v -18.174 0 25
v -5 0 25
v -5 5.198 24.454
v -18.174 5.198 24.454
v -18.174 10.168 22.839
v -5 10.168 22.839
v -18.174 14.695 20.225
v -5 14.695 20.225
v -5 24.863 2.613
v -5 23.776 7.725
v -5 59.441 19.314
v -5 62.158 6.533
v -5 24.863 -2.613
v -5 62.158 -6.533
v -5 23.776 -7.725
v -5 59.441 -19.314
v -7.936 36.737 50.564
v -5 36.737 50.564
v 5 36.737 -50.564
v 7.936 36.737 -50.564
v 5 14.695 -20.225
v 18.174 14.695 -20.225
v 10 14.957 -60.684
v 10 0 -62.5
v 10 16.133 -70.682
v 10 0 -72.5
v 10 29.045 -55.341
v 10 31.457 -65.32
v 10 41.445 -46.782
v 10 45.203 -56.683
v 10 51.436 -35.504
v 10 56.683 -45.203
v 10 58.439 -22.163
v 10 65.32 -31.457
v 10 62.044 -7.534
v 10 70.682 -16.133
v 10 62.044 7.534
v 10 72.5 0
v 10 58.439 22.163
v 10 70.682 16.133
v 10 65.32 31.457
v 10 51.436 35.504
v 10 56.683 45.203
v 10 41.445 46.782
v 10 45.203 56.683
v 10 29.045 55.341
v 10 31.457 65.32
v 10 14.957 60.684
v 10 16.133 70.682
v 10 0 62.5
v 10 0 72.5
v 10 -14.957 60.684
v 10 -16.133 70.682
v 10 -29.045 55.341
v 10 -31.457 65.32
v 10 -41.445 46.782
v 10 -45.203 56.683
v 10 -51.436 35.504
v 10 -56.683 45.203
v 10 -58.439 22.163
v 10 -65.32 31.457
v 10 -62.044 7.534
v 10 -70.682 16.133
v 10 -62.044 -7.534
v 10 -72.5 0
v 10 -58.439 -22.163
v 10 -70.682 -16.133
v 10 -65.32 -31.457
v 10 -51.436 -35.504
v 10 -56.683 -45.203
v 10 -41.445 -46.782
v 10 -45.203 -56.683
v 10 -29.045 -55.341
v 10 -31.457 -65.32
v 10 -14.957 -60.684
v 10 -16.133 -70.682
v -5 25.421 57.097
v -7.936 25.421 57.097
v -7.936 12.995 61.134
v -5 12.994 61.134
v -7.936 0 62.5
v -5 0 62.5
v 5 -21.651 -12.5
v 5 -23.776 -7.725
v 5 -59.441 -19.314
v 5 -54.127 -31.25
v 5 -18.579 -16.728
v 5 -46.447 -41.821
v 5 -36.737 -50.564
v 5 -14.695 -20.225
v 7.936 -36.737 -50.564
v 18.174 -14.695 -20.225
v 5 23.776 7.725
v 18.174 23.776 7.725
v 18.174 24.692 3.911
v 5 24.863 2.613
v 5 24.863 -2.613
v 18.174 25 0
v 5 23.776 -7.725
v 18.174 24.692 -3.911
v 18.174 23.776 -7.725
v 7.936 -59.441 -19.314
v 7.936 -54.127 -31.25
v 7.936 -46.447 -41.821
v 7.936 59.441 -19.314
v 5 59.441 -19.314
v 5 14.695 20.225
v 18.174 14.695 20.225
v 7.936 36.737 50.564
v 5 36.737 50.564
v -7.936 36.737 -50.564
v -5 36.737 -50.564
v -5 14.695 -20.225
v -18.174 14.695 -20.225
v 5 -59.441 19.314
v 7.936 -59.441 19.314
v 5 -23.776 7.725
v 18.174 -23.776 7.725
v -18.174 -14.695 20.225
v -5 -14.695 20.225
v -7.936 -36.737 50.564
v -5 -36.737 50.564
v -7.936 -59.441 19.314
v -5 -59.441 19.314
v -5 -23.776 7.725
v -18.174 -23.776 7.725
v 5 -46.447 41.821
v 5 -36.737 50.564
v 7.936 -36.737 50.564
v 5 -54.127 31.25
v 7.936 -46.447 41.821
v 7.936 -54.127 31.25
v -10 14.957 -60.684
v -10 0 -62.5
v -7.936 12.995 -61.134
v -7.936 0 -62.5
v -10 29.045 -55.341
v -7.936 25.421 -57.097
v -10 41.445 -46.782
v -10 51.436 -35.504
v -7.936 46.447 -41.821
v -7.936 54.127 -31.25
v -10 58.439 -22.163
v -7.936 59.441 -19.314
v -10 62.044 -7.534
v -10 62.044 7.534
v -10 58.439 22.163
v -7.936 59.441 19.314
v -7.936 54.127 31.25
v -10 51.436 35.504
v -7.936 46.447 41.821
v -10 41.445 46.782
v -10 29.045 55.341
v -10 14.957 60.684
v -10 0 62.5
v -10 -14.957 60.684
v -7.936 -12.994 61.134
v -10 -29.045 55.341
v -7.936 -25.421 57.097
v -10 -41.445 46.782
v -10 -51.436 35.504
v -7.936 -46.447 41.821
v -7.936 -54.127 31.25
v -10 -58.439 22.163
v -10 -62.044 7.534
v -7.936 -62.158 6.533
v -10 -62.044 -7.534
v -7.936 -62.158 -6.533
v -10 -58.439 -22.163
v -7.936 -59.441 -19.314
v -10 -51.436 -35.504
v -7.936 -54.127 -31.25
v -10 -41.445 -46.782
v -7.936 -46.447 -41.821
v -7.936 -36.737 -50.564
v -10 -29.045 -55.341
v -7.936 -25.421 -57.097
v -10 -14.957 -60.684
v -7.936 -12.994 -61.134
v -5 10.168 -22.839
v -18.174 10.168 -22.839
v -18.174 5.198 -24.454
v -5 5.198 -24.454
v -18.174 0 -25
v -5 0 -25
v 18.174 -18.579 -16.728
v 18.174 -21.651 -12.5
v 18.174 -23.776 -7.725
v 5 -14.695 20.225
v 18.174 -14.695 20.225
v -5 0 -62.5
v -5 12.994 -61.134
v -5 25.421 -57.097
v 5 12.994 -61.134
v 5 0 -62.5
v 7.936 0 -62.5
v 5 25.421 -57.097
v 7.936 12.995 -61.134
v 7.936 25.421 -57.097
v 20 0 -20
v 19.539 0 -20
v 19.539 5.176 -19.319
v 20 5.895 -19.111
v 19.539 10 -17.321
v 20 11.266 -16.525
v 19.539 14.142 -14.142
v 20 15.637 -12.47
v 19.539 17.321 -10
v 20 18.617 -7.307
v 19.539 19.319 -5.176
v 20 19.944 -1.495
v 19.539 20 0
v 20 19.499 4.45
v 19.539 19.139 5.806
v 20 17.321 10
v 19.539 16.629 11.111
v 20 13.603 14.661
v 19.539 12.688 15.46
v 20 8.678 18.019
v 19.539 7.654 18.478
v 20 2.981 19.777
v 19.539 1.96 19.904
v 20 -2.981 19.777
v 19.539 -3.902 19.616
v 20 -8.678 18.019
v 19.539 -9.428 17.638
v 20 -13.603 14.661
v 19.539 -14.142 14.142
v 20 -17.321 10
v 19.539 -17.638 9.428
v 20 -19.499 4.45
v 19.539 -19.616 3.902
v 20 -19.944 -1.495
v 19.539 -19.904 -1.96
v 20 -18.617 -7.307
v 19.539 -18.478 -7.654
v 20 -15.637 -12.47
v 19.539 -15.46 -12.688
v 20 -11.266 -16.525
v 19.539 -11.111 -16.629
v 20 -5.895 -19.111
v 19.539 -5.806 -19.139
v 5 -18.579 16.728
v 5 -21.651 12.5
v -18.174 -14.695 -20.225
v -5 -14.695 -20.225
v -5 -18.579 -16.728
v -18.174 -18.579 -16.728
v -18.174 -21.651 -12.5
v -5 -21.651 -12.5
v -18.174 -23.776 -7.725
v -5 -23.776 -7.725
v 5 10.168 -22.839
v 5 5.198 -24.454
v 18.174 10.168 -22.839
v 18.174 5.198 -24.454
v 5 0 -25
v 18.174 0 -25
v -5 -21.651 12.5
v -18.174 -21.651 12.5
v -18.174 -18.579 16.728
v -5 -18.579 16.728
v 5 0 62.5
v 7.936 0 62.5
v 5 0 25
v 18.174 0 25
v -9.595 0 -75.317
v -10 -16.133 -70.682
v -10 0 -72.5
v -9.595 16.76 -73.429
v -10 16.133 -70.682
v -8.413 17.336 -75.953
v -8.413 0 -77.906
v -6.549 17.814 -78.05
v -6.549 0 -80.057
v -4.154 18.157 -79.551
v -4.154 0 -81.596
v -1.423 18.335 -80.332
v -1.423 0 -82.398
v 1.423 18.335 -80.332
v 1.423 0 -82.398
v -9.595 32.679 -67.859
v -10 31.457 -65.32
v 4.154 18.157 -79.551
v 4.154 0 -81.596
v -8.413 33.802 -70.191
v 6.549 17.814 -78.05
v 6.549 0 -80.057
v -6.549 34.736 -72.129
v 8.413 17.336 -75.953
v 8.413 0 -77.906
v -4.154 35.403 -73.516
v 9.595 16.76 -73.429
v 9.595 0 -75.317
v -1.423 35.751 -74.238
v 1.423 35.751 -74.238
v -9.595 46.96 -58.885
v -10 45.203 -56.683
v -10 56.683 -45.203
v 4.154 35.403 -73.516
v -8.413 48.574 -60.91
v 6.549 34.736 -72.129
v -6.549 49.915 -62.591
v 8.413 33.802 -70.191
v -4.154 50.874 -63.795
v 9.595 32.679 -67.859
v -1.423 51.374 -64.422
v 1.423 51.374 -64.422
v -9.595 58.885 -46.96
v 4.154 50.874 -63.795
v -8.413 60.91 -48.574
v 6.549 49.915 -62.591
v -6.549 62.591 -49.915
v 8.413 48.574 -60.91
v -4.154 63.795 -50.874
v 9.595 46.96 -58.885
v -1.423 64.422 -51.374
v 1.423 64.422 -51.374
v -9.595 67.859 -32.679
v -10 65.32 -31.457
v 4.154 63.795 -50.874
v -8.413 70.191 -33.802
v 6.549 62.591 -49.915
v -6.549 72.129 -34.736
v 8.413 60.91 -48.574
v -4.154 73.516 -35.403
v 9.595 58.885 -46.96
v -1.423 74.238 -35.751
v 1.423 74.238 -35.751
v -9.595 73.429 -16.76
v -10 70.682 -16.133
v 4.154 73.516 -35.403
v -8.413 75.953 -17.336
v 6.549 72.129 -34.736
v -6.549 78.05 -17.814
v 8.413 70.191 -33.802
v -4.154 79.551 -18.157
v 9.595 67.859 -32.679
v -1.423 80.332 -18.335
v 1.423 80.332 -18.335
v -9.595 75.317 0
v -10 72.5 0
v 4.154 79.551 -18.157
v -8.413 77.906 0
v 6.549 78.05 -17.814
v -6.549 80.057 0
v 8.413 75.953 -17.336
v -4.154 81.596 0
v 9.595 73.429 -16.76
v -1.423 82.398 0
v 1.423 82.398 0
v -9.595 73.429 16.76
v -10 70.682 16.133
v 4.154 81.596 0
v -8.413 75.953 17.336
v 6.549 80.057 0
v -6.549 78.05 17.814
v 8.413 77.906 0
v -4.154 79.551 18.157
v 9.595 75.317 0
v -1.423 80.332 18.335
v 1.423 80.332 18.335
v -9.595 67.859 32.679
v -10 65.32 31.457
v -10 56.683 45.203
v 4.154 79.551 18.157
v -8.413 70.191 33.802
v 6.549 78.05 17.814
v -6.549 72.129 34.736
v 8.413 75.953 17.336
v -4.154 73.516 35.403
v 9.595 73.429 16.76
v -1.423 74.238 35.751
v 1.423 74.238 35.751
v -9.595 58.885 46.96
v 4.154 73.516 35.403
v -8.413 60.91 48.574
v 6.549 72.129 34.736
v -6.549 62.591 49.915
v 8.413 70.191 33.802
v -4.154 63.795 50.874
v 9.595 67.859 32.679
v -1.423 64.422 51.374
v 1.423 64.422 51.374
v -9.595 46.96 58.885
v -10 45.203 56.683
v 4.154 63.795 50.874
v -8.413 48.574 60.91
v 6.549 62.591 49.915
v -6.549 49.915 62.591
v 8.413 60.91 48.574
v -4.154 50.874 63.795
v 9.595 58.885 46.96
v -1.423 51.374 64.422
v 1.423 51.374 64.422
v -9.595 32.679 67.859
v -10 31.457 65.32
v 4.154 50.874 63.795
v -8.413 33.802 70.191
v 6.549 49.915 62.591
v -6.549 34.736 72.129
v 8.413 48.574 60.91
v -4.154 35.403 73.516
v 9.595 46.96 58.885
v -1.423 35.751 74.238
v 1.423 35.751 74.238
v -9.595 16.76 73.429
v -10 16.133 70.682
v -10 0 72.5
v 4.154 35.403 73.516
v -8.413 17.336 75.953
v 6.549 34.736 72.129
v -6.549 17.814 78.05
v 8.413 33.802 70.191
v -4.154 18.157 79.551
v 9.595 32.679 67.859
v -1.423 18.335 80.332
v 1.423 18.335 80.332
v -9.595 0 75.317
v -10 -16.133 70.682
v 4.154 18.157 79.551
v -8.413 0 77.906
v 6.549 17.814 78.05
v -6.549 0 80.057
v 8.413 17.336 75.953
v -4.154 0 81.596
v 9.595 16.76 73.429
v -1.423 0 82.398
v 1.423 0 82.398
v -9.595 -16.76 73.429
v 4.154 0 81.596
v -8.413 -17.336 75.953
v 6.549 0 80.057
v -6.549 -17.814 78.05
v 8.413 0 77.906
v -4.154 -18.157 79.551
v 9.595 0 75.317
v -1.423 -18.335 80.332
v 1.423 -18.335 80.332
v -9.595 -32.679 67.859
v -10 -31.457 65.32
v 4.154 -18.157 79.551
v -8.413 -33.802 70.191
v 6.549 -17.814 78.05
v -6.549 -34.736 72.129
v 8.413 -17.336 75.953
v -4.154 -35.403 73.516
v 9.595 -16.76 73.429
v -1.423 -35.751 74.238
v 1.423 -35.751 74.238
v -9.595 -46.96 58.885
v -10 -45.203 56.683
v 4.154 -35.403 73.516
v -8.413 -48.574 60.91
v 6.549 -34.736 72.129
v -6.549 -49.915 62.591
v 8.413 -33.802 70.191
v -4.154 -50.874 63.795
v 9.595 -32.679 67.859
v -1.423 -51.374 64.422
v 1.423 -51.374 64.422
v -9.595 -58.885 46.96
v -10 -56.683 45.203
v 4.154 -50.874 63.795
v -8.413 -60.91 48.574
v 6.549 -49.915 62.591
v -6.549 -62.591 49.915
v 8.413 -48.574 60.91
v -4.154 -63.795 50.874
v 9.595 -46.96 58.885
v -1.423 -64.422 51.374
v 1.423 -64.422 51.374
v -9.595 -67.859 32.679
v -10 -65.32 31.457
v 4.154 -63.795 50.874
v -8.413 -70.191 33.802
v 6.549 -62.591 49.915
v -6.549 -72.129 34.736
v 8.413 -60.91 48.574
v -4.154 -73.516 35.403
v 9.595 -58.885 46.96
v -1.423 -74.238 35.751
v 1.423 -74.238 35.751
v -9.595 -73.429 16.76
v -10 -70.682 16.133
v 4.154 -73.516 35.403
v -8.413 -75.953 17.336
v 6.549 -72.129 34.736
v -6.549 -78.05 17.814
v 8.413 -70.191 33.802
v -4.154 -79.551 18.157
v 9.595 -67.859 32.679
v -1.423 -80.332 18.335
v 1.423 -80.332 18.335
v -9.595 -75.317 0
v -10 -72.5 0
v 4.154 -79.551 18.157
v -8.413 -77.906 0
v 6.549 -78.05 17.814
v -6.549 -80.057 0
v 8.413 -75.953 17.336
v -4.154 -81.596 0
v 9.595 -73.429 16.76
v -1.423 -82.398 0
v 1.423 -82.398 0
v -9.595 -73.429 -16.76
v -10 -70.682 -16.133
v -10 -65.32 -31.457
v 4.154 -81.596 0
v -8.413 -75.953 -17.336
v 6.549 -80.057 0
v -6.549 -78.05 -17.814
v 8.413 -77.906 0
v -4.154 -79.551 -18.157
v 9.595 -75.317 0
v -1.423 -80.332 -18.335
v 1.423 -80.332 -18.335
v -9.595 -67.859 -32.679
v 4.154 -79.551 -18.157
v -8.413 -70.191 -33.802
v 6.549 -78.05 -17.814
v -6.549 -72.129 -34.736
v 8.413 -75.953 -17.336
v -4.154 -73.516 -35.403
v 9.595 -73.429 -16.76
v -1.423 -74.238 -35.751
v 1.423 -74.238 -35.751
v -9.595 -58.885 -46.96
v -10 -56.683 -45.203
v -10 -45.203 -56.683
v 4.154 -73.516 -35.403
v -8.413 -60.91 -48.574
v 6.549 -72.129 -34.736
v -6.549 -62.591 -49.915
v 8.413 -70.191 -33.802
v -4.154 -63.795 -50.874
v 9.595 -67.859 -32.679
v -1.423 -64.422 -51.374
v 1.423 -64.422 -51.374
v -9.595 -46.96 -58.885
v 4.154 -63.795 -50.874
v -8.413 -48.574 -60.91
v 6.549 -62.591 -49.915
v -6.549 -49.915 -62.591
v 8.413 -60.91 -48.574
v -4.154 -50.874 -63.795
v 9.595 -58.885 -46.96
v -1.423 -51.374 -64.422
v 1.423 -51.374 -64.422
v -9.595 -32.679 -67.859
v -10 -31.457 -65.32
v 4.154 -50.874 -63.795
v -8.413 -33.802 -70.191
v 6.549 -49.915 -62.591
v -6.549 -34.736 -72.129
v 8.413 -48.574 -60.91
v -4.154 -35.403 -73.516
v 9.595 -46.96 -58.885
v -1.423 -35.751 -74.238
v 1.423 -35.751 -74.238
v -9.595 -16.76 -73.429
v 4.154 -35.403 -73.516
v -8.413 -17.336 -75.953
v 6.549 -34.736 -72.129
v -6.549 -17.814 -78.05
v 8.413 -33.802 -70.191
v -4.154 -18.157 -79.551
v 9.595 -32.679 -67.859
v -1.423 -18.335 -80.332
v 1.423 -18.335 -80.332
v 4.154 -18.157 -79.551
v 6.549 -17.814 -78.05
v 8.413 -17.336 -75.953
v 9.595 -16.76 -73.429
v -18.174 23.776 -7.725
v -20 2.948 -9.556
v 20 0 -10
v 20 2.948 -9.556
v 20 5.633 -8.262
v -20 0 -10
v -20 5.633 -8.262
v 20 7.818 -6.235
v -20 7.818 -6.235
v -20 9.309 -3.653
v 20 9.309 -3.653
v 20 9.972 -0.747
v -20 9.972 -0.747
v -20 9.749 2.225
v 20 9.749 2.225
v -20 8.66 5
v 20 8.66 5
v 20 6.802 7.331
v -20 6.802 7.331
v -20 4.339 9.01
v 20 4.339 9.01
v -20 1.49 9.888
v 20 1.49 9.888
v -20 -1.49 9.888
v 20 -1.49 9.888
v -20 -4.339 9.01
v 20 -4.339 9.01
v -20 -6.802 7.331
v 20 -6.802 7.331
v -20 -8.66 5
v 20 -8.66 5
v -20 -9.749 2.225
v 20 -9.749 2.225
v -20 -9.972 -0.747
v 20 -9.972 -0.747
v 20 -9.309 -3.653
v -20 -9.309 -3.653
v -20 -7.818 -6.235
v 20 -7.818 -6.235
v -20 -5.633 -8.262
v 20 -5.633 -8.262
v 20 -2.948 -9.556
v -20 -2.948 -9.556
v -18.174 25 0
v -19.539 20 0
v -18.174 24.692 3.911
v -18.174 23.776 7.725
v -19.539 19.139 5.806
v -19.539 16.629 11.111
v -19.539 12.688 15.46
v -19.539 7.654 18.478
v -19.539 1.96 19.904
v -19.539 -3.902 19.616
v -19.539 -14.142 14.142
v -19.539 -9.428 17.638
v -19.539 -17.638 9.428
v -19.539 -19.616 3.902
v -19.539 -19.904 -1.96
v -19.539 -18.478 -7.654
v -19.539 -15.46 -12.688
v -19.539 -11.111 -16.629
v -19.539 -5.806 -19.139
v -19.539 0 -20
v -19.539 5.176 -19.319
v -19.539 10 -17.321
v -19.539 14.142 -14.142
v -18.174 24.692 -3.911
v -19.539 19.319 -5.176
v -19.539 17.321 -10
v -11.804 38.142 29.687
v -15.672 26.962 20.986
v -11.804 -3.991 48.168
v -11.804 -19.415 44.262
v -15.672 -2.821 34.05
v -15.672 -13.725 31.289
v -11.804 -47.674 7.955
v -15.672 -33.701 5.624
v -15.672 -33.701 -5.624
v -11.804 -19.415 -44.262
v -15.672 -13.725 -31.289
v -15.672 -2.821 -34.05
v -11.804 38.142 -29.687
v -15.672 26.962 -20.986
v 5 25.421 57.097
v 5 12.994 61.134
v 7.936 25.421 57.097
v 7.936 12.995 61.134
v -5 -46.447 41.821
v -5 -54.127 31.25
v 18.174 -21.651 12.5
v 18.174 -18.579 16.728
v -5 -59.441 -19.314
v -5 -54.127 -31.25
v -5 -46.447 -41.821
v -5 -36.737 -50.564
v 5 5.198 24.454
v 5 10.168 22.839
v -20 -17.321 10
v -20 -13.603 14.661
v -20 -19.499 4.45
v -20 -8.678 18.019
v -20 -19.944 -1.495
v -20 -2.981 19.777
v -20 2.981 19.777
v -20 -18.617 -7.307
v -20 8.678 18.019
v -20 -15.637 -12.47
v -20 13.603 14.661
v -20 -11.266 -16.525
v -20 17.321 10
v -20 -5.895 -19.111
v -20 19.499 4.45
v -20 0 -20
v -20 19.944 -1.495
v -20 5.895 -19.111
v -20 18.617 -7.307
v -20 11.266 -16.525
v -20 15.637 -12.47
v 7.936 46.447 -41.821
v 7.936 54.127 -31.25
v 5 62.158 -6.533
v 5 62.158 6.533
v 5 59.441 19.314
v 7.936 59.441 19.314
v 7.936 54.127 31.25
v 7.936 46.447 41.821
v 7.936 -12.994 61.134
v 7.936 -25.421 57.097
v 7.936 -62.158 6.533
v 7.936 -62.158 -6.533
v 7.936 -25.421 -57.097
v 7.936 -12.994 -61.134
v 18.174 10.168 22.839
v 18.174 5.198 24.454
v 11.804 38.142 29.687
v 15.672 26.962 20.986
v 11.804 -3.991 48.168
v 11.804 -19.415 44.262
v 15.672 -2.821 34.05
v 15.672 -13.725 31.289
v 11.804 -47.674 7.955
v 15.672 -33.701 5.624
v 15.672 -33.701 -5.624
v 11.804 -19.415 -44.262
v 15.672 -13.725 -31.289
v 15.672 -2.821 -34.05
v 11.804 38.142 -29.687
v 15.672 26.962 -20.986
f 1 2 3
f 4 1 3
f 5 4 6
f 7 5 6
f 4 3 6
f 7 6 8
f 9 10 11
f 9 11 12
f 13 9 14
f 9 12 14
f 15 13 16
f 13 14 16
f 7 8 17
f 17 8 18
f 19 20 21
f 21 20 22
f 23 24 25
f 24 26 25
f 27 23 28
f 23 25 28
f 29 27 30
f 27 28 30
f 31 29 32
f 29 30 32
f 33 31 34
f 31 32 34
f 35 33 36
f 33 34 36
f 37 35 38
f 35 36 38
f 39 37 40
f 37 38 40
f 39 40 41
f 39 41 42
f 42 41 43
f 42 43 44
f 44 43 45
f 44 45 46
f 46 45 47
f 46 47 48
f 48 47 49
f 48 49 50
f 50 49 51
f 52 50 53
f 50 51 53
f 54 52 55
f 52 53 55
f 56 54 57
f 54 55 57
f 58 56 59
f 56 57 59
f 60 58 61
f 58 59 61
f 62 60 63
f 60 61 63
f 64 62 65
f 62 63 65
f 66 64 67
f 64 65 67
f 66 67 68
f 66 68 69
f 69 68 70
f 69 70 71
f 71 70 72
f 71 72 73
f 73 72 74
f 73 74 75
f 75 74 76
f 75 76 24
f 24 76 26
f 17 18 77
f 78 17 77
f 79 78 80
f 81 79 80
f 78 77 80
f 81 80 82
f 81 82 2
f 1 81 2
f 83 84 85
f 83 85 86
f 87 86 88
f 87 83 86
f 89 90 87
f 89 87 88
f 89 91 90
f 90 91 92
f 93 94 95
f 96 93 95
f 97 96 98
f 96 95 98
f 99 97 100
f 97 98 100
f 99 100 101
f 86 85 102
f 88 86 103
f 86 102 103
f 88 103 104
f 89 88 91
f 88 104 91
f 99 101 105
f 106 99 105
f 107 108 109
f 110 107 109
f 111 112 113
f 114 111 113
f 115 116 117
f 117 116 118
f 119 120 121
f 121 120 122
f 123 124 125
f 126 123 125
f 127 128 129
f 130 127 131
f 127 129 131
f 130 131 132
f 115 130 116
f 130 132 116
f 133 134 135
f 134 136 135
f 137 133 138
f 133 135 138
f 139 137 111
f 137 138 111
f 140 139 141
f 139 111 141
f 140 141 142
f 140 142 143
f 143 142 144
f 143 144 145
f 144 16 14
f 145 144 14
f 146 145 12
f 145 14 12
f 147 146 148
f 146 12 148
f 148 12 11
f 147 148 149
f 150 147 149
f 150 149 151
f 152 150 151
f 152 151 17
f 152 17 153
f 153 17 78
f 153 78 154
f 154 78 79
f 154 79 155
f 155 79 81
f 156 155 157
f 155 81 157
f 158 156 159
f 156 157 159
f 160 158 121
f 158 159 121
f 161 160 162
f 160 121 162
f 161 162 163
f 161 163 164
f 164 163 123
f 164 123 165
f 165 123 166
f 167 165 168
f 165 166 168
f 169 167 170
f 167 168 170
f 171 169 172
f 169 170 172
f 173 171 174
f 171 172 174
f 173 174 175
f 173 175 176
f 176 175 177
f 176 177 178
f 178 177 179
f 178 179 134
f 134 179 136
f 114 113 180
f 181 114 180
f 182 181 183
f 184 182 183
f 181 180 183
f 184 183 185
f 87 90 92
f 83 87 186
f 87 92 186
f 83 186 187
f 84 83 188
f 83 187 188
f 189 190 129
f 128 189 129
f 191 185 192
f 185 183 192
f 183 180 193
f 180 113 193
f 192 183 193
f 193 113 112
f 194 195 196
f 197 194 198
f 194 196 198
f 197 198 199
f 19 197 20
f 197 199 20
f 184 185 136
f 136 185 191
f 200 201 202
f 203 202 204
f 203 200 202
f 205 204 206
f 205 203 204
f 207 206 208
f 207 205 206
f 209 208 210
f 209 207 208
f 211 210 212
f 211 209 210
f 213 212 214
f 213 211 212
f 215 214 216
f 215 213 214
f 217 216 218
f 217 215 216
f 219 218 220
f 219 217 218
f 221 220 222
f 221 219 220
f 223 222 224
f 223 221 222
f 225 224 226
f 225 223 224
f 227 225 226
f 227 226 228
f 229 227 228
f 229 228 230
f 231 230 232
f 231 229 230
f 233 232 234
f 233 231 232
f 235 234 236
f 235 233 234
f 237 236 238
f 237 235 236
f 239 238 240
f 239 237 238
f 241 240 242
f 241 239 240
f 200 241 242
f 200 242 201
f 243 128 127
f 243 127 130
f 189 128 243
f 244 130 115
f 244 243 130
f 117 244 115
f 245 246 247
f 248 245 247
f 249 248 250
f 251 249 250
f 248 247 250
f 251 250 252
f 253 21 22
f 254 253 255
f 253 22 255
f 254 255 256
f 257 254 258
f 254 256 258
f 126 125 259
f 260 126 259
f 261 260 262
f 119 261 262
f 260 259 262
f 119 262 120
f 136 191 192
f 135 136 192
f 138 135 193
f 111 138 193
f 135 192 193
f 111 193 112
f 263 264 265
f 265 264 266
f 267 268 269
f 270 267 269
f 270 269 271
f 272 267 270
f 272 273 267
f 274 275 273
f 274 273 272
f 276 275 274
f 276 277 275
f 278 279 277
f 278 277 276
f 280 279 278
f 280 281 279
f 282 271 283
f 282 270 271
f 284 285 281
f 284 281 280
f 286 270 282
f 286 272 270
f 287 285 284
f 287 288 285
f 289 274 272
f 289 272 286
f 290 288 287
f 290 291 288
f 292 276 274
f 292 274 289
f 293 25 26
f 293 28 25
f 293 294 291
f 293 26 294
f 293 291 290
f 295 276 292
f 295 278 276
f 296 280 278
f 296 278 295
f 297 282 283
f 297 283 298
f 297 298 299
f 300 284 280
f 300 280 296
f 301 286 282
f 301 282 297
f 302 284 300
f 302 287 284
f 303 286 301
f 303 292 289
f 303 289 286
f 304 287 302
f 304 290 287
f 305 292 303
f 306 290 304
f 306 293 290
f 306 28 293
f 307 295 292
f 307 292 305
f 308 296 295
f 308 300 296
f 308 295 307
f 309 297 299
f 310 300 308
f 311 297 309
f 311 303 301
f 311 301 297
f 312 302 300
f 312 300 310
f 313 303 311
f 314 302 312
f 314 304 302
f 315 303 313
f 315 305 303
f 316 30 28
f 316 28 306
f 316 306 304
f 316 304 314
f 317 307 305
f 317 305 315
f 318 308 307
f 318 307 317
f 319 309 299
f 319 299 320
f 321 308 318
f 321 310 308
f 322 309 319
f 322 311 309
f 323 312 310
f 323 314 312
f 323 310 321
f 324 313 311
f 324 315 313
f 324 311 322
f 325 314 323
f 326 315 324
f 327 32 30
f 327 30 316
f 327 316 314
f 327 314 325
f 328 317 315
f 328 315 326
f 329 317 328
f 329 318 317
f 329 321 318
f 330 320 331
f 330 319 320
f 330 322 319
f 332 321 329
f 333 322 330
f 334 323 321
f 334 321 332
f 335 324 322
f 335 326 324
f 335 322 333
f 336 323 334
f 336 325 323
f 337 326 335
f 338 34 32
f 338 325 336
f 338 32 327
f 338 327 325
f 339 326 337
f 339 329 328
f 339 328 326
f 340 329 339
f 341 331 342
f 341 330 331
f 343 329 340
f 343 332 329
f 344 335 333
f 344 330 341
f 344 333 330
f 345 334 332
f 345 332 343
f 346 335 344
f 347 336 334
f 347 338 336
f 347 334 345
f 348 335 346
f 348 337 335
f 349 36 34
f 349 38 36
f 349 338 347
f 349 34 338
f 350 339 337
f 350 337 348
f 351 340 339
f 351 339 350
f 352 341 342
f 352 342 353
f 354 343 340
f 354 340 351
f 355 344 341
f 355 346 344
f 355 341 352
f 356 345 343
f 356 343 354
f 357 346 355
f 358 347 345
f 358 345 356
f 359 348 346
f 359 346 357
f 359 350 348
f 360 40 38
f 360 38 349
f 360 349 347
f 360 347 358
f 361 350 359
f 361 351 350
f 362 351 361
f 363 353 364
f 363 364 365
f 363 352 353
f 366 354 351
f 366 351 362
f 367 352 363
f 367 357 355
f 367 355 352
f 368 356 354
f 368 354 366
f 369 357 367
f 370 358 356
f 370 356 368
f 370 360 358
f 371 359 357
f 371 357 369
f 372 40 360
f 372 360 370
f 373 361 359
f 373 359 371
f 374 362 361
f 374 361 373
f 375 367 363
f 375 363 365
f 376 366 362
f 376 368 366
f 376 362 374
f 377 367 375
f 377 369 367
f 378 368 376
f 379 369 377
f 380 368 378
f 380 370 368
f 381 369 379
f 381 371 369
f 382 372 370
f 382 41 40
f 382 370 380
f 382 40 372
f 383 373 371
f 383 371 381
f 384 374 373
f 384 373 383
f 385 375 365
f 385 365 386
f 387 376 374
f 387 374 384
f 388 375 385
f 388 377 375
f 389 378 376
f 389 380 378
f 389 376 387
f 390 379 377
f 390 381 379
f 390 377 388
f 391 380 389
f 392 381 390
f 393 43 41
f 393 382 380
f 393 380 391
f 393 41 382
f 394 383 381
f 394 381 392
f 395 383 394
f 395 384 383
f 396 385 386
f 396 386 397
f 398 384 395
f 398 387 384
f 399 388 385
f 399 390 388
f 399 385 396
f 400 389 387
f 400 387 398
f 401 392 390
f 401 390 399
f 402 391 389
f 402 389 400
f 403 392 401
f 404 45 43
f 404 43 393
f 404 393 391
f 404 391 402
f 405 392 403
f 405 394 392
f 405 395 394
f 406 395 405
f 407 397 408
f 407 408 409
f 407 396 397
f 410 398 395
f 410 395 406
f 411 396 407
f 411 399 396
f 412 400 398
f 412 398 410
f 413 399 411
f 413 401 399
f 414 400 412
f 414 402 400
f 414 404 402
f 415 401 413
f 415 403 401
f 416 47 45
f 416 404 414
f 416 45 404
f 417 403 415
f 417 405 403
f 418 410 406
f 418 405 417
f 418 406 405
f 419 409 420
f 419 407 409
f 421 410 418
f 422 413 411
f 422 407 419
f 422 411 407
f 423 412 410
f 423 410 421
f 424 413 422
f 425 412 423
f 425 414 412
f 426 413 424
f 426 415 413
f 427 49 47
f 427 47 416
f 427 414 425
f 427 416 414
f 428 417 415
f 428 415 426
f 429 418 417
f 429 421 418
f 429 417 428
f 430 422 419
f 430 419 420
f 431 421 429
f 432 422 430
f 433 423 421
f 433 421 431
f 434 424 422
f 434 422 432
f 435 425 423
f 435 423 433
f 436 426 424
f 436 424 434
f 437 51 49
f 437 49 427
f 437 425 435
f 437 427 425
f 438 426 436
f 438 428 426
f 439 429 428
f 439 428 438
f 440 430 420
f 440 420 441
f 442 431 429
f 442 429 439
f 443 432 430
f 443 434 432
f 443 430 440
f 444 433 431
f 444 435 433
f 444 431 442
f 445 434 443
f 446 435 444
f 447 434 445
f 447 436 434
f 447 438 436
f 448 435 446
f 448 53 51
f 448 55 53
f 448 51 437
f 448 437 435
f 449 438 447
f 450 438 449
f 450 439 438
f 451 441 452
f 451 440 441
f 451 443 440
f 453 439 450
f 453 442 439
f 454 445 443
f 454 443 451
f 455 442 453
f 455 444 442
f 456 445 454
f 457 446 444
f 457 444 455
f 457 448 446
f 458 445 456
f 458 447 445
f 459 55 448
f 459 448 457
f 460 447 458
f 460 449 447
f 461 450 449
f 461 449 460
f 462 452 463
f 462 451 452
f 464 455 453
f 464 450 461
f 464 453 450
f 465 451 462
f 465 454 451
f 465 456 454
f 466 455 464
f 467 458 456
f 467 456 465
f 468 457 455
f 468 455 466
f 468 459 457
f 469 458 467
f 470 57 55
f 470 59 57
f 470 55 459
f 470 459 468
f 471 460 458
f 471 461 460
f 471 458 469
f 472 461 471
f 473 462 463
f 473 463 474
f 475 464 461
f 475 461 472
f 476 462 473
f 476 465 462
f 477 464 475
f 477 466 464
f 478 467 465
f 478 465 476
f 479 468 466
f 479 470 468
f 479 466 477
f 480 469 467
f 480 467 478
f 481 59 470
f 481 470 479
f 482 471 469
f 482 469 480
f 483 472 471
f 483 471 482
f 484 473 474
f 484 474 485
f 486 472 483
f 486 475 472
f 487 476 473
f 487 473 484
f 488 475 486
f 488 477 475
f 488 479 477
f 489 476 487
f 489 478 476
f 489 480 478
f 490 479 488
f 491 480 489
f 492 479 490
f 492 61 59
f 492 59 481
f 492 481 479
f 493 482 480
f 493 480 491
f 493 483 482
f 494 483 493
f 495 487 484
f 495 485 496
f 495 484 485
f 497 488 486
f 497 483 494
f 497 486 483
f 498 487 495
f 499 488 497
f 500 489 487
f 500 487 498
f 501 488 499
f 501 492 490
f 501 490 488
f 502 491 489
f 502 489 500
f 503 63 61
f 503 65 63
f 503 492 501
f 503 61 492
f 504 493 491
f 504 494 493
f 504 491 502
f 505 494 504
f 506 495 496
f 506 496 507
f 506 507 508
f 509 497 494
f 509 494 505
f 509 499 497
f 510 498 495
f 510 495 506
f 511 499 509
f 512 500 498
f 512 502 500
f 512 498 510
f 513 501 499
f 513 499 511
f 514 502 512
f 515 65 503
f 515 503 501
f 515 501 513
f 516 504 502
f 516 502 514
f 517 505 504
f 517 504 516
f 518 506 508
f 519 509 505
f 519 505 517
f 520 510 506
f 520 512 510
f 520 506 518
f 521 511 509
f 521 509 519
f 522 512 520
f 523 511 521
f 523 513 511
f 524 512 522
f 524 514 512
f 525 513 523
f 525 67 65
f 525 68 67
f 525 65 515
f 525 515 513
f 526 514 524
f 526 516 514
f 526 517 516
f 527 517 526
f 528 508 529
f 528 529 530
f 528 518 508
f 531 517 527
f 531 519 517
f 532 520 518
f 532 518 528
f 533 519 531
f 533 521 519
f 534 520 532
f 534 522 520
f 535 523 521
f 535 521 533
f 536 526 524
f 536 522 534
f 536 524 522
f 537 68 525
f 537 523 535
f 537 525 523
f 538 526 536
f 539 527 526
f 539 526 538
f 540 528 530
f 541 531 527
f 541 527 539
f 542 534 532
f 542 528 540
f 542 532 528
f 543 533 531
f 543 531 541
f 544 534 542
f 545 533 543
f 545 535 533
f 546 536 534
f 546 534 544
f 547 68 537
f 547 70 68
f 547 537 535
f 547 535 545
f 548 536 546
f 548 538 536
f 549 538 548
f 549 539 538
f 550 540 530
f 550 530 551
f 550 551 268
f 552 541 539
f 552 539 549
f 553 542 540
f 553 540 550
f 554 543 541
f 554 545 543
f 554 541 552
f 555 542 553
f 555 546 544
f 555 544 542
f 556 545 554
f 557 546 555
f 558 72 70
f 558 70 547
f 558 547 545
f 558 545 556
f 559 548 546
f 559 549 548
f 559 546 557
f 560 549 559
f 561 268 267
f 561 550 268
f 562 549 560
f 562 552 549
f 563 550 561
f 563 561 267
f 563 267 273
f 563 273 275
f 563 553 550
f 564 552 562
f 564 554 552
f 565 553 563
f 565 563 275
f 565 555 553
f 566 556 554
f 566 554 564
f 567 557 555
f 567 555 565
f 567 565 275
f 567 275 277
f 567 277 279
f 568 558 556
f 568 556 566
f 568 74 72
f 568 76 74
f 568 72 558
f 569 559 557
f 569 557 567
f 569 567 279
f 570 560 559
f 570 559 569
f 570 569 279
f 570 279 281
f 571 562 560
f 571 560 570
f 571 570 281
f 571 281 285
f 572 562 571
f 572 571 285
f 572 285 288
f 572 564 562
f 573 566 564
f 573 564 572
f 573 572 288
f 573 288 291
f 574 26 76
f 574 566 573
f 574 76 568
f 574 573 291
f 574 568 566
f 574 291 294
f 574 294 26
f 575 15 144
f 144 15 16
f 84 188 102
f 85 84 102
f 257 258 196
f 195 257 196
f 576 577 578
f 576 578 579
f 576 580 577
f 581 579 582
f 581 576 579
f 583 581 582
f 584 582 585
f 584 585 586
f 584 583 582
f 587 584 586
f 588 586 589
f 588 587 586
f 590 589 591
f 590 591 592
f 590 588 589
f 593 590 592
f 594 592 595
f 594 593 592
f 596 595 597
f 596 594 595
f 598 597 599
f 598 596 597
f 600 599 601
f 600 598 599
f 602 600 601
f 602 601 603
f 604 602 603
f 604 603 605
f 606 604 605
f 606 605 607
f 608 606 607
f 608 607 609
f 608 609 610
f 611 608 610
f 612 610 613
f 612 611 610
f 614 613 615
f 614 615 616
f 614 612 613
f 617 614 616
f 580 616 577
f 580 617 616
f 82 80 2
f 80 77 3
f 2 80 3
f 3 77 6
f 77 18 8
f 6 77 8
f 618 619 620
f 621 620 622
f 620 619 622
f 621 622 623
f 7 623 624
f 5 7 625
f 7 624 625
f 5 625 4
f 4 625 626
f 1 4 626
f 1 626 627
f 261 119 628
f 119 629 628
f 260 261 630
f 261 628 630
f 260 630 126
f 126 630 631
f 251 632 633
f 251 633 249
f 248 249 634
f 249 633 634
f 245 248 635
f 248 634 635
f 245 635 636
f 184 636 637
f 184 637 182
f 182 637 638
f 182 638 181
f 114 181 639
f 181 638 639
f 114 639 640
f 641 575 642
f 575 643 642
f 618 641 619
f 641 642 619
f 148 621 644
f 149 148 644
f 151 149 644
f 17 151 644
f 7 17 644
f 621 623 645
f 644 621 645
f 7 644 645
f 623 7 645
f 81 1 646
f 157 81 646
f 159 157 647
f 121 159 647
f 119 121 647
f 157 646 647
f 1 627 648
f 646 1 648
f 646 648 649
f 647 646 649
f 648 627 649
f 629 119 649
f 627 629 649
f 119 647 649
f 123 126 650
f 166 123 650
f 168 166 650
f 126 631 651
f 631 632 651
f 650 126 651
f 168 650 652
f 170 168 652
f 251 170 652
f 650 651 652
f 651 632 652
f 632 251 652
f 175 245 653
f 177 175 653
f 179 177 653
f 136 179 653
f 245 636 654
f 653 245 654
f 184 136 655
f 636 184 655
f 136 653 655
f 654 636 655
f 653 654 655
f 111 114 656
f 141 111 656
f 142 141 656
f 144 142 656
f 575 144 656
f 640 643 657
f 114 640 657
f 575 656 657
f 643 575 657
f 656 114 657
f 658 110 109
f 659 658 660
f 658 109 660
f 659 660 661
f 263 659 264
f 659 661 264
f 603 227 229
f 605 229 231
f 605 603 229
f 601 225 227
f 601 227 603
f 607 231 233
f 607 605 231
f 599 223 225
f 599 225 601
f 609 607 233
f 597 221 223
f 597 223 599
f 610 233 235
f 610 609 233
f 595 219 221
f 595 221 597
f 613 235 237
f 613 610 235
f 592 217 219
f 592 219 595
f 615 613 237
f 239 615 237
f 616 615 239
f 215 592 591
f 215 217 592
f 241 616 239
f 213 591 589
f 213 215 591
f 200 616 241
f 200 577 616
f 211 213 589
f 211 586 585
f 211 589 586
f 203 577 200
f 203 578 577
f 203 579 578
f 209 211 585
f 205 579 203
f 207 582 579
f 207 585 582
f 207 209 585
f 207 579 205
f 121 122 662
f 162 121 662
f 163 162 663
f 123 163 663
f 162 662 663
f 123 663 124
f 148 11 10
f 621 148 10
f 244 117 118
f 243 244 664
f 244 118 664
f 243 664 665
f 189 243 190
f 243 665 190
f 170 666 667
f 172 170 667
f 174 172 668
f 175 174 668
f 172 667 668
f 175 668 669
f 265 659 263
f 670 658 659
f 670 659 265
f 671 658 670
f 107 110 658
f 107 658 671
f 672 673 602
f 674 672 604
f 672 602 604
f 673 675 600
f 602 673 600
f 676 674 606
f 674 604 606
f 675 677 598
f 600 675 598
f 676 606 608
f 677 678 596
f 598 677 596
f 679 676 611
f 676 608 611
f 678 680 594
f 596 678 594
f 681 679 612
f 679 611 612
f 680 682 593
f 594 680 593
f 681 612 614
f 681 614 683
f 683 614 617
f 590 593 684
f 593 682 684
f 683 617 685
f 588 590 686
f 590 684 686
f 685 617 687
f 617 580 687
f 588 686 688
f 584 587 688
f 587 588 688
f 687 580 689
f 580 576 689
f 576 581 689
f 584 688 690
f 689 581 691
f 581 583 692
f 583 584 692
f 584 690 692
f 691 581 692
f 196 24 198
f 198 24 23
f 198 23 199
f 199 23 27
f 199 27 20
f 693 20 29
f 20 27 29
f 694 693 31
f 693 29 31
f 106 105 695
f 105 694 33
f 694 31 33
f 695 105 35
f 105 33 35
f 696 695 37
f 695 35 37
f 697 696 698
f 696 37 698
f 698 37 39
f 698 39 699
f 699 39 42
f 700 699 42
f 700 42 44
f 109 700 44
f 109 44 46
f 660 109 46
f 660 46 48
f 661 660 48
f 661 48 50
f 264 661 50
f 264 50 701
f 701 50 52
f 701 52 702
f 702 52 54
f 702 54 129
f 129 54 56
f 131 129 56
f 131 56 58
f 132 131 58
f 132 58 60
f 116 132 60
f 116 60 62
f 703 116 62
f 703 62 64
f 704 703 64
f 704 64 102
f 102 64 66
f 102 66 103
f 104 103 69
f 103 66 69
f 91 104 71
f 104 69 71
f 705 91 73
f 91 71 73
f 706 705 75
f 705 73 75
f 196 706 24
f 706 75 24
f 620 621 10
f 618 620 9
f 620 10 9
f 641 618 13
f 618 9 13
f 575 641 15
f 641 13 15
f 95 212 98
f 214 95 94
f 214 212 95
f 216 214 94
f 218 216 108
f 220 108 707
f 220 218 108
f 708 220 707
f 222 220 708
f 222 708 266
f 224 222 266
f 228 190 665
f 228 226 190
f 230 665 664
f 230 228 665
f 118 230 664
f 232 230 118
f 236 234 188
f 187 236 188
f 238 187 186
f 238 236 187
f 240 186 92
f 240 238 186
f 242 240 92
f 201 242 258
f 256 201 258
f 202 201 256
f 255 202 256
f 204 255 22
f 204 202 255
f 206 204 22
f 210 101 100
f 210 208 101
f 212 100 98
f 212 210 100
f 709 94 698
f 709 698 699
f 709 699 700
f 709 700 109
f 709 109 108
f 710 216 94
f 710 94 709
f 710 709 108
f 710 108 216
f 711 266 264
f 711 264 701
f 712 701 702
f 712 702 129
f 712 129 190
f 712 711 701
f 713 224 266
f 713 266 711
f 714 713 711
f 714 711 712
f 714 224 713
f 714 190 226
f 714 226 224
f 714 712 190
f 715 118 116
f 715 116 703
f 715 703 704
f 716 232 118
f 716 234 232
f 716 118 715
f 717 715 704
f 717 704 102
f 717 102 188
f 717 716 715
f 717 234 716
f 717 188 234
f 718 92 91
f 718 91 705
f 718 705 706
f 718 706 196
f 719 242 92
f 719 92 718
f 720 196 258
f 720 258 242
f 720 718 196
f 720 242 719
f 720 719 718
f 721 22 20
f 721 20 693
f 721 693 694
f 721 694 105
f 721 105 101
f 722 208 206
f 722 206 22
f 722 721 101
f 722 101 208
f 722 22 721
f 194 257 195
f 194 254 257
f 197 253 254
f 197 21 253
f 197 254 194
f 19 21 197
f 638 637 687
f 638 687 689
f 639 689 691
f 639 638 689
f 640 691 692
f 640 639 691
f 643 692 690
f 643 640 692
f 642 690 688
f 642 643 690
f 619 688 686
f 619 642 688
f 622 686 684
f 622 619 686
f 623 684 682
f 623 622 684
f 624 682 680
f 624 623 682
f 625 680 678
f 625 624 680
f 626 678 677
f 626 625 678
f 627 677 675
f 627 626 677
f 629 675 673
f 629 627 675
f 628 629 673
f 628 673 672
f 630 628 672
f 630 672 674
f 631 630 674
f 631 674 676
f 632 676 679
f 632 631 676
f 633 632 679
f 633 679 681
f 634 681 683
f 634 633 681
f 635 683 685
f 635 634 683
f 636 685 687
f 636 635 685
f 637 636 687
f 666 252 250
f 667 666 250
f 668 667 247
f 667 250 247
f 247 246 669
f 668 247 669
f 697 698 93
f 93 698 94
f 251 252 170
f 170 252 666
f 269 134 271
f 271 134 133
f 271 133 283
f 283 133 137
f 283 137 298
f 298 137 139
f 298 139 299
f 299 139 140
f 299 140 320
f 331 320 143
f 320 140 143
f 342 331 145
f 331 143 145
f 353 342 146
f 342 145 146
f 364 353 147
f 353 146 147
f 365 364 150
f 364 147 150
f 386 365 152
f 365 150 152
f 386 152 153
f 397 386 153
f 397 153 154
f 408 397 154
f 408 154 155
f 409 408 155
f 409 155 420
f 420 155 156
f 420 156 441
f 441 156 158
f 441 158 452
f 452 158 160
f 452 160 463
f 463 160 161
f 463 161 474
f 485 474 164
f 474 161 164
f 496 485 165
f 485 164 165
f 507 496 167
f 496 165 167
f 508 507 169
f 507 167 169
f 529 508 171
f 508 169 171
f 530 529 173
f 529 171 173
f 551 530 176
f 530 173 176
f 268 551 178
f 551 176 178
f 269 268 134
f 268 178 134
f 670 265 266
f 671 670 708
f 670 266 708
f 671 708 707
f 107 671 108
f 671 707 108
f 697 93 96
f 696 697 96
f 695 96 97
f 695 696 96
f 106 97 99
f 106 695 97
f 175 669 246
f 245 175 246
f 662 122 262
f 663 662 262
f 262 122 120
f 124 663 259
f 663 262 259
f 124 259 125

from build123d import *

# Parameters (mm, degrees)
SKETCH4_R            = 72.5
BOSS_EXTRUDE7_DEPTH  = 25
SKETCH13_R           = 72.5
BOSS_EXTRUDE8_DEPTH  = 5
SKETCH14_R           = 20
CUT_EXTRUDE1_DEPTH   = 25
SKETCH15_R           = 20
SKETCH15_R_2         = 10
BOSS_EXTRUDE10_DEPTH = 20


with BuildPart() as part:
    # Sweep1: sweep along a path in Sketch1
    with BuildLine(Plane(origin=(0, 0, 0), x_dir=(0, 0, -1), z_dir=(1, 0, 0))) as sweep1_path:
        CenterArc((0, 0), 72.5, 0, 360)
    # Sketch3 → Sweep1 (sweep)
    with BuildSketch(Plane.XY):
        with BuildLine():
            Line((10, 72.5), (10, 62.5))
            Line((10, 62.5), (-10, 62.5))
            Line((-10, 62.5), (-10, 72.5))
            ThreePointArc((-10, 72.5), (0, 82.5), (10, 72.5))
        make_face()
    sweep(path=sweep1_path.line)



with BuildPart() as body_2:
    # Sketch4 → Boss-Extrude7 (new body, symmetric)
    with BuildSketch(Plane(origin=(0, 0, 0), x_dir=(0, 0, -1), z_dir=(1, 0, 0))):
        Circle(SKETCH4_R)
        with BuildLine():
            Line((25, 0), (62.5, 0))
            ThreePointArc((62.5, 0), (59.441032268, 19.313562148), (50.563562148, 36.736578268))
            Line((50.563562148, 36.736578268), (20.225424859, 14.694631307))
            ThreePointArc((20.225424859, 14.694631307), (23.776412907, 7.725424859), (25, 0))
        make_face(mode=Mode.SUBTRACT)
        with BuildLine():
            Line((7.725424859, 23.776412907), (19.313562148, 59.441032268))
            ThreePointArc((19.313562148, 59.441032268), (0, 62.5), (-19.313562148, 59.441032268))
            Line((-19.313562148, 59.441032268), (-7.725424859, 23.776412907))
            ThreePointArc((-7.725424859, 23.776412907), (0, 25), (7.725424859, 23.776412907))
        make_face(mode=Mode.SUBTRACT)
        with BuildLine():
            Line((7.725424859, -23.776412907), (19.313562148, -59.441032268))
            ThreePointArc((19.313562148, -59.441032268), (36.736578268, -50.563562148), (50.563562148, -36.736578268))
            Line((50.563562148, -36.736578268), (20.225424859, -14.694631307))
            ThreePointArc((20.225424859, -14.694631307), (14.694631307, -20.225424859), (7.725424859, -23.776412907))
        make_face(mode=Mode.SUBTRACT)
        with BuildLine():
            Line((-20.225424859, -14.694631307), (-50.563562148, -36.736578268))
            ThreePointArc((-50.563562148, -36.736578268), (-36.736578268, -50.563562148), (-19.313562148, -59.441032268))
            Line((-19.313562148, -59.441032268), (-7.725424859, -23.776412907))
            ThreePointArc((-7.725424859, -23.776412907), (-14.694631307, -20.225424859), (-20.225424859, -14.694631307))
        make_face(mode=Mode.SUBTRACT)
        with BuildLine():
            Line((-20.225424859, 14.694631307), (-50.563562148, 36.736578268))
            ThreePointArc((-50.563562148, 36.736578268), (-59.441032268, 19.313562148), (-62.5, 0))
            Line((-62.5, 0), (-25, 0))
            ThreePointArc((-25, 0), (-23.776412907, 7.725424859), (-20.225424859, 14.694631307))
        make_face(mode=Mode.SUBTRACT)
    extrude(amount=BOSS_EXTRUDE7_DEPTH, both=True)

    # Sketch12 → Cut-Revolve11 (revolve, cut)
    with BuildSketch(Plane.XY):
        Polygon((-25, 0), (-32.140648249, 0), (-32.140648249, 73.19155482), (-5.016609541, 73.19155482), align=None)
        Polygon((25, 0), (32.140648249, 0), (32.140648249, 73.19155482), (5.016609541, 73.19155482), align=None)
    revolve(axis=Axis((-46.840153715, 0, 0), (1, 0, 0)), mode=Mode.SUBTRACT)


with BuildPart() as part_1:
    add(part.part)

    add(body_2.part)  # Boss-Extrude8 merges body 2
    # Sketch13 → Boss-Extrude8 (add, symmetric)
    with BuildSketch(Plane(origin=(0, 0, 0), x_dir=(0, 0, -1), z_dir=(1, 0, 0))):
        Circle(SKETCH13_R)
    extrude(amount=BOSS_EXTRUDE8_DEPTH, both=True)

    # Sketch14 → Cut-Extrude1 (cut, symmetric)
    with BuildSketch(Plane(origin=(0, 0, 0), x_dir=(0, 0, -1), z_dir=(1, 0, 0))):
        Circle(SKETCH14_R)
    extrude(amount=CUT_EXTRUDE1_DEPTH, both=True, mode=Mode.SUBTRACT)

    # Sketch15 → Boss-Extrude10 (add, symmetric)
    with BuildSketch(Plane(origin=(0, 0, 0), x_dir=(0, 0, -1), z_dir=(1, 0, 0))):
        Circle(SKETCH15_R)
        Circle(SKETCH15_R_2, mode=Mode.SUBTRACT)
    extrude(amount=BOSS_EXTRUDE10_DEPTH, both=True)


solid = part_1.part
